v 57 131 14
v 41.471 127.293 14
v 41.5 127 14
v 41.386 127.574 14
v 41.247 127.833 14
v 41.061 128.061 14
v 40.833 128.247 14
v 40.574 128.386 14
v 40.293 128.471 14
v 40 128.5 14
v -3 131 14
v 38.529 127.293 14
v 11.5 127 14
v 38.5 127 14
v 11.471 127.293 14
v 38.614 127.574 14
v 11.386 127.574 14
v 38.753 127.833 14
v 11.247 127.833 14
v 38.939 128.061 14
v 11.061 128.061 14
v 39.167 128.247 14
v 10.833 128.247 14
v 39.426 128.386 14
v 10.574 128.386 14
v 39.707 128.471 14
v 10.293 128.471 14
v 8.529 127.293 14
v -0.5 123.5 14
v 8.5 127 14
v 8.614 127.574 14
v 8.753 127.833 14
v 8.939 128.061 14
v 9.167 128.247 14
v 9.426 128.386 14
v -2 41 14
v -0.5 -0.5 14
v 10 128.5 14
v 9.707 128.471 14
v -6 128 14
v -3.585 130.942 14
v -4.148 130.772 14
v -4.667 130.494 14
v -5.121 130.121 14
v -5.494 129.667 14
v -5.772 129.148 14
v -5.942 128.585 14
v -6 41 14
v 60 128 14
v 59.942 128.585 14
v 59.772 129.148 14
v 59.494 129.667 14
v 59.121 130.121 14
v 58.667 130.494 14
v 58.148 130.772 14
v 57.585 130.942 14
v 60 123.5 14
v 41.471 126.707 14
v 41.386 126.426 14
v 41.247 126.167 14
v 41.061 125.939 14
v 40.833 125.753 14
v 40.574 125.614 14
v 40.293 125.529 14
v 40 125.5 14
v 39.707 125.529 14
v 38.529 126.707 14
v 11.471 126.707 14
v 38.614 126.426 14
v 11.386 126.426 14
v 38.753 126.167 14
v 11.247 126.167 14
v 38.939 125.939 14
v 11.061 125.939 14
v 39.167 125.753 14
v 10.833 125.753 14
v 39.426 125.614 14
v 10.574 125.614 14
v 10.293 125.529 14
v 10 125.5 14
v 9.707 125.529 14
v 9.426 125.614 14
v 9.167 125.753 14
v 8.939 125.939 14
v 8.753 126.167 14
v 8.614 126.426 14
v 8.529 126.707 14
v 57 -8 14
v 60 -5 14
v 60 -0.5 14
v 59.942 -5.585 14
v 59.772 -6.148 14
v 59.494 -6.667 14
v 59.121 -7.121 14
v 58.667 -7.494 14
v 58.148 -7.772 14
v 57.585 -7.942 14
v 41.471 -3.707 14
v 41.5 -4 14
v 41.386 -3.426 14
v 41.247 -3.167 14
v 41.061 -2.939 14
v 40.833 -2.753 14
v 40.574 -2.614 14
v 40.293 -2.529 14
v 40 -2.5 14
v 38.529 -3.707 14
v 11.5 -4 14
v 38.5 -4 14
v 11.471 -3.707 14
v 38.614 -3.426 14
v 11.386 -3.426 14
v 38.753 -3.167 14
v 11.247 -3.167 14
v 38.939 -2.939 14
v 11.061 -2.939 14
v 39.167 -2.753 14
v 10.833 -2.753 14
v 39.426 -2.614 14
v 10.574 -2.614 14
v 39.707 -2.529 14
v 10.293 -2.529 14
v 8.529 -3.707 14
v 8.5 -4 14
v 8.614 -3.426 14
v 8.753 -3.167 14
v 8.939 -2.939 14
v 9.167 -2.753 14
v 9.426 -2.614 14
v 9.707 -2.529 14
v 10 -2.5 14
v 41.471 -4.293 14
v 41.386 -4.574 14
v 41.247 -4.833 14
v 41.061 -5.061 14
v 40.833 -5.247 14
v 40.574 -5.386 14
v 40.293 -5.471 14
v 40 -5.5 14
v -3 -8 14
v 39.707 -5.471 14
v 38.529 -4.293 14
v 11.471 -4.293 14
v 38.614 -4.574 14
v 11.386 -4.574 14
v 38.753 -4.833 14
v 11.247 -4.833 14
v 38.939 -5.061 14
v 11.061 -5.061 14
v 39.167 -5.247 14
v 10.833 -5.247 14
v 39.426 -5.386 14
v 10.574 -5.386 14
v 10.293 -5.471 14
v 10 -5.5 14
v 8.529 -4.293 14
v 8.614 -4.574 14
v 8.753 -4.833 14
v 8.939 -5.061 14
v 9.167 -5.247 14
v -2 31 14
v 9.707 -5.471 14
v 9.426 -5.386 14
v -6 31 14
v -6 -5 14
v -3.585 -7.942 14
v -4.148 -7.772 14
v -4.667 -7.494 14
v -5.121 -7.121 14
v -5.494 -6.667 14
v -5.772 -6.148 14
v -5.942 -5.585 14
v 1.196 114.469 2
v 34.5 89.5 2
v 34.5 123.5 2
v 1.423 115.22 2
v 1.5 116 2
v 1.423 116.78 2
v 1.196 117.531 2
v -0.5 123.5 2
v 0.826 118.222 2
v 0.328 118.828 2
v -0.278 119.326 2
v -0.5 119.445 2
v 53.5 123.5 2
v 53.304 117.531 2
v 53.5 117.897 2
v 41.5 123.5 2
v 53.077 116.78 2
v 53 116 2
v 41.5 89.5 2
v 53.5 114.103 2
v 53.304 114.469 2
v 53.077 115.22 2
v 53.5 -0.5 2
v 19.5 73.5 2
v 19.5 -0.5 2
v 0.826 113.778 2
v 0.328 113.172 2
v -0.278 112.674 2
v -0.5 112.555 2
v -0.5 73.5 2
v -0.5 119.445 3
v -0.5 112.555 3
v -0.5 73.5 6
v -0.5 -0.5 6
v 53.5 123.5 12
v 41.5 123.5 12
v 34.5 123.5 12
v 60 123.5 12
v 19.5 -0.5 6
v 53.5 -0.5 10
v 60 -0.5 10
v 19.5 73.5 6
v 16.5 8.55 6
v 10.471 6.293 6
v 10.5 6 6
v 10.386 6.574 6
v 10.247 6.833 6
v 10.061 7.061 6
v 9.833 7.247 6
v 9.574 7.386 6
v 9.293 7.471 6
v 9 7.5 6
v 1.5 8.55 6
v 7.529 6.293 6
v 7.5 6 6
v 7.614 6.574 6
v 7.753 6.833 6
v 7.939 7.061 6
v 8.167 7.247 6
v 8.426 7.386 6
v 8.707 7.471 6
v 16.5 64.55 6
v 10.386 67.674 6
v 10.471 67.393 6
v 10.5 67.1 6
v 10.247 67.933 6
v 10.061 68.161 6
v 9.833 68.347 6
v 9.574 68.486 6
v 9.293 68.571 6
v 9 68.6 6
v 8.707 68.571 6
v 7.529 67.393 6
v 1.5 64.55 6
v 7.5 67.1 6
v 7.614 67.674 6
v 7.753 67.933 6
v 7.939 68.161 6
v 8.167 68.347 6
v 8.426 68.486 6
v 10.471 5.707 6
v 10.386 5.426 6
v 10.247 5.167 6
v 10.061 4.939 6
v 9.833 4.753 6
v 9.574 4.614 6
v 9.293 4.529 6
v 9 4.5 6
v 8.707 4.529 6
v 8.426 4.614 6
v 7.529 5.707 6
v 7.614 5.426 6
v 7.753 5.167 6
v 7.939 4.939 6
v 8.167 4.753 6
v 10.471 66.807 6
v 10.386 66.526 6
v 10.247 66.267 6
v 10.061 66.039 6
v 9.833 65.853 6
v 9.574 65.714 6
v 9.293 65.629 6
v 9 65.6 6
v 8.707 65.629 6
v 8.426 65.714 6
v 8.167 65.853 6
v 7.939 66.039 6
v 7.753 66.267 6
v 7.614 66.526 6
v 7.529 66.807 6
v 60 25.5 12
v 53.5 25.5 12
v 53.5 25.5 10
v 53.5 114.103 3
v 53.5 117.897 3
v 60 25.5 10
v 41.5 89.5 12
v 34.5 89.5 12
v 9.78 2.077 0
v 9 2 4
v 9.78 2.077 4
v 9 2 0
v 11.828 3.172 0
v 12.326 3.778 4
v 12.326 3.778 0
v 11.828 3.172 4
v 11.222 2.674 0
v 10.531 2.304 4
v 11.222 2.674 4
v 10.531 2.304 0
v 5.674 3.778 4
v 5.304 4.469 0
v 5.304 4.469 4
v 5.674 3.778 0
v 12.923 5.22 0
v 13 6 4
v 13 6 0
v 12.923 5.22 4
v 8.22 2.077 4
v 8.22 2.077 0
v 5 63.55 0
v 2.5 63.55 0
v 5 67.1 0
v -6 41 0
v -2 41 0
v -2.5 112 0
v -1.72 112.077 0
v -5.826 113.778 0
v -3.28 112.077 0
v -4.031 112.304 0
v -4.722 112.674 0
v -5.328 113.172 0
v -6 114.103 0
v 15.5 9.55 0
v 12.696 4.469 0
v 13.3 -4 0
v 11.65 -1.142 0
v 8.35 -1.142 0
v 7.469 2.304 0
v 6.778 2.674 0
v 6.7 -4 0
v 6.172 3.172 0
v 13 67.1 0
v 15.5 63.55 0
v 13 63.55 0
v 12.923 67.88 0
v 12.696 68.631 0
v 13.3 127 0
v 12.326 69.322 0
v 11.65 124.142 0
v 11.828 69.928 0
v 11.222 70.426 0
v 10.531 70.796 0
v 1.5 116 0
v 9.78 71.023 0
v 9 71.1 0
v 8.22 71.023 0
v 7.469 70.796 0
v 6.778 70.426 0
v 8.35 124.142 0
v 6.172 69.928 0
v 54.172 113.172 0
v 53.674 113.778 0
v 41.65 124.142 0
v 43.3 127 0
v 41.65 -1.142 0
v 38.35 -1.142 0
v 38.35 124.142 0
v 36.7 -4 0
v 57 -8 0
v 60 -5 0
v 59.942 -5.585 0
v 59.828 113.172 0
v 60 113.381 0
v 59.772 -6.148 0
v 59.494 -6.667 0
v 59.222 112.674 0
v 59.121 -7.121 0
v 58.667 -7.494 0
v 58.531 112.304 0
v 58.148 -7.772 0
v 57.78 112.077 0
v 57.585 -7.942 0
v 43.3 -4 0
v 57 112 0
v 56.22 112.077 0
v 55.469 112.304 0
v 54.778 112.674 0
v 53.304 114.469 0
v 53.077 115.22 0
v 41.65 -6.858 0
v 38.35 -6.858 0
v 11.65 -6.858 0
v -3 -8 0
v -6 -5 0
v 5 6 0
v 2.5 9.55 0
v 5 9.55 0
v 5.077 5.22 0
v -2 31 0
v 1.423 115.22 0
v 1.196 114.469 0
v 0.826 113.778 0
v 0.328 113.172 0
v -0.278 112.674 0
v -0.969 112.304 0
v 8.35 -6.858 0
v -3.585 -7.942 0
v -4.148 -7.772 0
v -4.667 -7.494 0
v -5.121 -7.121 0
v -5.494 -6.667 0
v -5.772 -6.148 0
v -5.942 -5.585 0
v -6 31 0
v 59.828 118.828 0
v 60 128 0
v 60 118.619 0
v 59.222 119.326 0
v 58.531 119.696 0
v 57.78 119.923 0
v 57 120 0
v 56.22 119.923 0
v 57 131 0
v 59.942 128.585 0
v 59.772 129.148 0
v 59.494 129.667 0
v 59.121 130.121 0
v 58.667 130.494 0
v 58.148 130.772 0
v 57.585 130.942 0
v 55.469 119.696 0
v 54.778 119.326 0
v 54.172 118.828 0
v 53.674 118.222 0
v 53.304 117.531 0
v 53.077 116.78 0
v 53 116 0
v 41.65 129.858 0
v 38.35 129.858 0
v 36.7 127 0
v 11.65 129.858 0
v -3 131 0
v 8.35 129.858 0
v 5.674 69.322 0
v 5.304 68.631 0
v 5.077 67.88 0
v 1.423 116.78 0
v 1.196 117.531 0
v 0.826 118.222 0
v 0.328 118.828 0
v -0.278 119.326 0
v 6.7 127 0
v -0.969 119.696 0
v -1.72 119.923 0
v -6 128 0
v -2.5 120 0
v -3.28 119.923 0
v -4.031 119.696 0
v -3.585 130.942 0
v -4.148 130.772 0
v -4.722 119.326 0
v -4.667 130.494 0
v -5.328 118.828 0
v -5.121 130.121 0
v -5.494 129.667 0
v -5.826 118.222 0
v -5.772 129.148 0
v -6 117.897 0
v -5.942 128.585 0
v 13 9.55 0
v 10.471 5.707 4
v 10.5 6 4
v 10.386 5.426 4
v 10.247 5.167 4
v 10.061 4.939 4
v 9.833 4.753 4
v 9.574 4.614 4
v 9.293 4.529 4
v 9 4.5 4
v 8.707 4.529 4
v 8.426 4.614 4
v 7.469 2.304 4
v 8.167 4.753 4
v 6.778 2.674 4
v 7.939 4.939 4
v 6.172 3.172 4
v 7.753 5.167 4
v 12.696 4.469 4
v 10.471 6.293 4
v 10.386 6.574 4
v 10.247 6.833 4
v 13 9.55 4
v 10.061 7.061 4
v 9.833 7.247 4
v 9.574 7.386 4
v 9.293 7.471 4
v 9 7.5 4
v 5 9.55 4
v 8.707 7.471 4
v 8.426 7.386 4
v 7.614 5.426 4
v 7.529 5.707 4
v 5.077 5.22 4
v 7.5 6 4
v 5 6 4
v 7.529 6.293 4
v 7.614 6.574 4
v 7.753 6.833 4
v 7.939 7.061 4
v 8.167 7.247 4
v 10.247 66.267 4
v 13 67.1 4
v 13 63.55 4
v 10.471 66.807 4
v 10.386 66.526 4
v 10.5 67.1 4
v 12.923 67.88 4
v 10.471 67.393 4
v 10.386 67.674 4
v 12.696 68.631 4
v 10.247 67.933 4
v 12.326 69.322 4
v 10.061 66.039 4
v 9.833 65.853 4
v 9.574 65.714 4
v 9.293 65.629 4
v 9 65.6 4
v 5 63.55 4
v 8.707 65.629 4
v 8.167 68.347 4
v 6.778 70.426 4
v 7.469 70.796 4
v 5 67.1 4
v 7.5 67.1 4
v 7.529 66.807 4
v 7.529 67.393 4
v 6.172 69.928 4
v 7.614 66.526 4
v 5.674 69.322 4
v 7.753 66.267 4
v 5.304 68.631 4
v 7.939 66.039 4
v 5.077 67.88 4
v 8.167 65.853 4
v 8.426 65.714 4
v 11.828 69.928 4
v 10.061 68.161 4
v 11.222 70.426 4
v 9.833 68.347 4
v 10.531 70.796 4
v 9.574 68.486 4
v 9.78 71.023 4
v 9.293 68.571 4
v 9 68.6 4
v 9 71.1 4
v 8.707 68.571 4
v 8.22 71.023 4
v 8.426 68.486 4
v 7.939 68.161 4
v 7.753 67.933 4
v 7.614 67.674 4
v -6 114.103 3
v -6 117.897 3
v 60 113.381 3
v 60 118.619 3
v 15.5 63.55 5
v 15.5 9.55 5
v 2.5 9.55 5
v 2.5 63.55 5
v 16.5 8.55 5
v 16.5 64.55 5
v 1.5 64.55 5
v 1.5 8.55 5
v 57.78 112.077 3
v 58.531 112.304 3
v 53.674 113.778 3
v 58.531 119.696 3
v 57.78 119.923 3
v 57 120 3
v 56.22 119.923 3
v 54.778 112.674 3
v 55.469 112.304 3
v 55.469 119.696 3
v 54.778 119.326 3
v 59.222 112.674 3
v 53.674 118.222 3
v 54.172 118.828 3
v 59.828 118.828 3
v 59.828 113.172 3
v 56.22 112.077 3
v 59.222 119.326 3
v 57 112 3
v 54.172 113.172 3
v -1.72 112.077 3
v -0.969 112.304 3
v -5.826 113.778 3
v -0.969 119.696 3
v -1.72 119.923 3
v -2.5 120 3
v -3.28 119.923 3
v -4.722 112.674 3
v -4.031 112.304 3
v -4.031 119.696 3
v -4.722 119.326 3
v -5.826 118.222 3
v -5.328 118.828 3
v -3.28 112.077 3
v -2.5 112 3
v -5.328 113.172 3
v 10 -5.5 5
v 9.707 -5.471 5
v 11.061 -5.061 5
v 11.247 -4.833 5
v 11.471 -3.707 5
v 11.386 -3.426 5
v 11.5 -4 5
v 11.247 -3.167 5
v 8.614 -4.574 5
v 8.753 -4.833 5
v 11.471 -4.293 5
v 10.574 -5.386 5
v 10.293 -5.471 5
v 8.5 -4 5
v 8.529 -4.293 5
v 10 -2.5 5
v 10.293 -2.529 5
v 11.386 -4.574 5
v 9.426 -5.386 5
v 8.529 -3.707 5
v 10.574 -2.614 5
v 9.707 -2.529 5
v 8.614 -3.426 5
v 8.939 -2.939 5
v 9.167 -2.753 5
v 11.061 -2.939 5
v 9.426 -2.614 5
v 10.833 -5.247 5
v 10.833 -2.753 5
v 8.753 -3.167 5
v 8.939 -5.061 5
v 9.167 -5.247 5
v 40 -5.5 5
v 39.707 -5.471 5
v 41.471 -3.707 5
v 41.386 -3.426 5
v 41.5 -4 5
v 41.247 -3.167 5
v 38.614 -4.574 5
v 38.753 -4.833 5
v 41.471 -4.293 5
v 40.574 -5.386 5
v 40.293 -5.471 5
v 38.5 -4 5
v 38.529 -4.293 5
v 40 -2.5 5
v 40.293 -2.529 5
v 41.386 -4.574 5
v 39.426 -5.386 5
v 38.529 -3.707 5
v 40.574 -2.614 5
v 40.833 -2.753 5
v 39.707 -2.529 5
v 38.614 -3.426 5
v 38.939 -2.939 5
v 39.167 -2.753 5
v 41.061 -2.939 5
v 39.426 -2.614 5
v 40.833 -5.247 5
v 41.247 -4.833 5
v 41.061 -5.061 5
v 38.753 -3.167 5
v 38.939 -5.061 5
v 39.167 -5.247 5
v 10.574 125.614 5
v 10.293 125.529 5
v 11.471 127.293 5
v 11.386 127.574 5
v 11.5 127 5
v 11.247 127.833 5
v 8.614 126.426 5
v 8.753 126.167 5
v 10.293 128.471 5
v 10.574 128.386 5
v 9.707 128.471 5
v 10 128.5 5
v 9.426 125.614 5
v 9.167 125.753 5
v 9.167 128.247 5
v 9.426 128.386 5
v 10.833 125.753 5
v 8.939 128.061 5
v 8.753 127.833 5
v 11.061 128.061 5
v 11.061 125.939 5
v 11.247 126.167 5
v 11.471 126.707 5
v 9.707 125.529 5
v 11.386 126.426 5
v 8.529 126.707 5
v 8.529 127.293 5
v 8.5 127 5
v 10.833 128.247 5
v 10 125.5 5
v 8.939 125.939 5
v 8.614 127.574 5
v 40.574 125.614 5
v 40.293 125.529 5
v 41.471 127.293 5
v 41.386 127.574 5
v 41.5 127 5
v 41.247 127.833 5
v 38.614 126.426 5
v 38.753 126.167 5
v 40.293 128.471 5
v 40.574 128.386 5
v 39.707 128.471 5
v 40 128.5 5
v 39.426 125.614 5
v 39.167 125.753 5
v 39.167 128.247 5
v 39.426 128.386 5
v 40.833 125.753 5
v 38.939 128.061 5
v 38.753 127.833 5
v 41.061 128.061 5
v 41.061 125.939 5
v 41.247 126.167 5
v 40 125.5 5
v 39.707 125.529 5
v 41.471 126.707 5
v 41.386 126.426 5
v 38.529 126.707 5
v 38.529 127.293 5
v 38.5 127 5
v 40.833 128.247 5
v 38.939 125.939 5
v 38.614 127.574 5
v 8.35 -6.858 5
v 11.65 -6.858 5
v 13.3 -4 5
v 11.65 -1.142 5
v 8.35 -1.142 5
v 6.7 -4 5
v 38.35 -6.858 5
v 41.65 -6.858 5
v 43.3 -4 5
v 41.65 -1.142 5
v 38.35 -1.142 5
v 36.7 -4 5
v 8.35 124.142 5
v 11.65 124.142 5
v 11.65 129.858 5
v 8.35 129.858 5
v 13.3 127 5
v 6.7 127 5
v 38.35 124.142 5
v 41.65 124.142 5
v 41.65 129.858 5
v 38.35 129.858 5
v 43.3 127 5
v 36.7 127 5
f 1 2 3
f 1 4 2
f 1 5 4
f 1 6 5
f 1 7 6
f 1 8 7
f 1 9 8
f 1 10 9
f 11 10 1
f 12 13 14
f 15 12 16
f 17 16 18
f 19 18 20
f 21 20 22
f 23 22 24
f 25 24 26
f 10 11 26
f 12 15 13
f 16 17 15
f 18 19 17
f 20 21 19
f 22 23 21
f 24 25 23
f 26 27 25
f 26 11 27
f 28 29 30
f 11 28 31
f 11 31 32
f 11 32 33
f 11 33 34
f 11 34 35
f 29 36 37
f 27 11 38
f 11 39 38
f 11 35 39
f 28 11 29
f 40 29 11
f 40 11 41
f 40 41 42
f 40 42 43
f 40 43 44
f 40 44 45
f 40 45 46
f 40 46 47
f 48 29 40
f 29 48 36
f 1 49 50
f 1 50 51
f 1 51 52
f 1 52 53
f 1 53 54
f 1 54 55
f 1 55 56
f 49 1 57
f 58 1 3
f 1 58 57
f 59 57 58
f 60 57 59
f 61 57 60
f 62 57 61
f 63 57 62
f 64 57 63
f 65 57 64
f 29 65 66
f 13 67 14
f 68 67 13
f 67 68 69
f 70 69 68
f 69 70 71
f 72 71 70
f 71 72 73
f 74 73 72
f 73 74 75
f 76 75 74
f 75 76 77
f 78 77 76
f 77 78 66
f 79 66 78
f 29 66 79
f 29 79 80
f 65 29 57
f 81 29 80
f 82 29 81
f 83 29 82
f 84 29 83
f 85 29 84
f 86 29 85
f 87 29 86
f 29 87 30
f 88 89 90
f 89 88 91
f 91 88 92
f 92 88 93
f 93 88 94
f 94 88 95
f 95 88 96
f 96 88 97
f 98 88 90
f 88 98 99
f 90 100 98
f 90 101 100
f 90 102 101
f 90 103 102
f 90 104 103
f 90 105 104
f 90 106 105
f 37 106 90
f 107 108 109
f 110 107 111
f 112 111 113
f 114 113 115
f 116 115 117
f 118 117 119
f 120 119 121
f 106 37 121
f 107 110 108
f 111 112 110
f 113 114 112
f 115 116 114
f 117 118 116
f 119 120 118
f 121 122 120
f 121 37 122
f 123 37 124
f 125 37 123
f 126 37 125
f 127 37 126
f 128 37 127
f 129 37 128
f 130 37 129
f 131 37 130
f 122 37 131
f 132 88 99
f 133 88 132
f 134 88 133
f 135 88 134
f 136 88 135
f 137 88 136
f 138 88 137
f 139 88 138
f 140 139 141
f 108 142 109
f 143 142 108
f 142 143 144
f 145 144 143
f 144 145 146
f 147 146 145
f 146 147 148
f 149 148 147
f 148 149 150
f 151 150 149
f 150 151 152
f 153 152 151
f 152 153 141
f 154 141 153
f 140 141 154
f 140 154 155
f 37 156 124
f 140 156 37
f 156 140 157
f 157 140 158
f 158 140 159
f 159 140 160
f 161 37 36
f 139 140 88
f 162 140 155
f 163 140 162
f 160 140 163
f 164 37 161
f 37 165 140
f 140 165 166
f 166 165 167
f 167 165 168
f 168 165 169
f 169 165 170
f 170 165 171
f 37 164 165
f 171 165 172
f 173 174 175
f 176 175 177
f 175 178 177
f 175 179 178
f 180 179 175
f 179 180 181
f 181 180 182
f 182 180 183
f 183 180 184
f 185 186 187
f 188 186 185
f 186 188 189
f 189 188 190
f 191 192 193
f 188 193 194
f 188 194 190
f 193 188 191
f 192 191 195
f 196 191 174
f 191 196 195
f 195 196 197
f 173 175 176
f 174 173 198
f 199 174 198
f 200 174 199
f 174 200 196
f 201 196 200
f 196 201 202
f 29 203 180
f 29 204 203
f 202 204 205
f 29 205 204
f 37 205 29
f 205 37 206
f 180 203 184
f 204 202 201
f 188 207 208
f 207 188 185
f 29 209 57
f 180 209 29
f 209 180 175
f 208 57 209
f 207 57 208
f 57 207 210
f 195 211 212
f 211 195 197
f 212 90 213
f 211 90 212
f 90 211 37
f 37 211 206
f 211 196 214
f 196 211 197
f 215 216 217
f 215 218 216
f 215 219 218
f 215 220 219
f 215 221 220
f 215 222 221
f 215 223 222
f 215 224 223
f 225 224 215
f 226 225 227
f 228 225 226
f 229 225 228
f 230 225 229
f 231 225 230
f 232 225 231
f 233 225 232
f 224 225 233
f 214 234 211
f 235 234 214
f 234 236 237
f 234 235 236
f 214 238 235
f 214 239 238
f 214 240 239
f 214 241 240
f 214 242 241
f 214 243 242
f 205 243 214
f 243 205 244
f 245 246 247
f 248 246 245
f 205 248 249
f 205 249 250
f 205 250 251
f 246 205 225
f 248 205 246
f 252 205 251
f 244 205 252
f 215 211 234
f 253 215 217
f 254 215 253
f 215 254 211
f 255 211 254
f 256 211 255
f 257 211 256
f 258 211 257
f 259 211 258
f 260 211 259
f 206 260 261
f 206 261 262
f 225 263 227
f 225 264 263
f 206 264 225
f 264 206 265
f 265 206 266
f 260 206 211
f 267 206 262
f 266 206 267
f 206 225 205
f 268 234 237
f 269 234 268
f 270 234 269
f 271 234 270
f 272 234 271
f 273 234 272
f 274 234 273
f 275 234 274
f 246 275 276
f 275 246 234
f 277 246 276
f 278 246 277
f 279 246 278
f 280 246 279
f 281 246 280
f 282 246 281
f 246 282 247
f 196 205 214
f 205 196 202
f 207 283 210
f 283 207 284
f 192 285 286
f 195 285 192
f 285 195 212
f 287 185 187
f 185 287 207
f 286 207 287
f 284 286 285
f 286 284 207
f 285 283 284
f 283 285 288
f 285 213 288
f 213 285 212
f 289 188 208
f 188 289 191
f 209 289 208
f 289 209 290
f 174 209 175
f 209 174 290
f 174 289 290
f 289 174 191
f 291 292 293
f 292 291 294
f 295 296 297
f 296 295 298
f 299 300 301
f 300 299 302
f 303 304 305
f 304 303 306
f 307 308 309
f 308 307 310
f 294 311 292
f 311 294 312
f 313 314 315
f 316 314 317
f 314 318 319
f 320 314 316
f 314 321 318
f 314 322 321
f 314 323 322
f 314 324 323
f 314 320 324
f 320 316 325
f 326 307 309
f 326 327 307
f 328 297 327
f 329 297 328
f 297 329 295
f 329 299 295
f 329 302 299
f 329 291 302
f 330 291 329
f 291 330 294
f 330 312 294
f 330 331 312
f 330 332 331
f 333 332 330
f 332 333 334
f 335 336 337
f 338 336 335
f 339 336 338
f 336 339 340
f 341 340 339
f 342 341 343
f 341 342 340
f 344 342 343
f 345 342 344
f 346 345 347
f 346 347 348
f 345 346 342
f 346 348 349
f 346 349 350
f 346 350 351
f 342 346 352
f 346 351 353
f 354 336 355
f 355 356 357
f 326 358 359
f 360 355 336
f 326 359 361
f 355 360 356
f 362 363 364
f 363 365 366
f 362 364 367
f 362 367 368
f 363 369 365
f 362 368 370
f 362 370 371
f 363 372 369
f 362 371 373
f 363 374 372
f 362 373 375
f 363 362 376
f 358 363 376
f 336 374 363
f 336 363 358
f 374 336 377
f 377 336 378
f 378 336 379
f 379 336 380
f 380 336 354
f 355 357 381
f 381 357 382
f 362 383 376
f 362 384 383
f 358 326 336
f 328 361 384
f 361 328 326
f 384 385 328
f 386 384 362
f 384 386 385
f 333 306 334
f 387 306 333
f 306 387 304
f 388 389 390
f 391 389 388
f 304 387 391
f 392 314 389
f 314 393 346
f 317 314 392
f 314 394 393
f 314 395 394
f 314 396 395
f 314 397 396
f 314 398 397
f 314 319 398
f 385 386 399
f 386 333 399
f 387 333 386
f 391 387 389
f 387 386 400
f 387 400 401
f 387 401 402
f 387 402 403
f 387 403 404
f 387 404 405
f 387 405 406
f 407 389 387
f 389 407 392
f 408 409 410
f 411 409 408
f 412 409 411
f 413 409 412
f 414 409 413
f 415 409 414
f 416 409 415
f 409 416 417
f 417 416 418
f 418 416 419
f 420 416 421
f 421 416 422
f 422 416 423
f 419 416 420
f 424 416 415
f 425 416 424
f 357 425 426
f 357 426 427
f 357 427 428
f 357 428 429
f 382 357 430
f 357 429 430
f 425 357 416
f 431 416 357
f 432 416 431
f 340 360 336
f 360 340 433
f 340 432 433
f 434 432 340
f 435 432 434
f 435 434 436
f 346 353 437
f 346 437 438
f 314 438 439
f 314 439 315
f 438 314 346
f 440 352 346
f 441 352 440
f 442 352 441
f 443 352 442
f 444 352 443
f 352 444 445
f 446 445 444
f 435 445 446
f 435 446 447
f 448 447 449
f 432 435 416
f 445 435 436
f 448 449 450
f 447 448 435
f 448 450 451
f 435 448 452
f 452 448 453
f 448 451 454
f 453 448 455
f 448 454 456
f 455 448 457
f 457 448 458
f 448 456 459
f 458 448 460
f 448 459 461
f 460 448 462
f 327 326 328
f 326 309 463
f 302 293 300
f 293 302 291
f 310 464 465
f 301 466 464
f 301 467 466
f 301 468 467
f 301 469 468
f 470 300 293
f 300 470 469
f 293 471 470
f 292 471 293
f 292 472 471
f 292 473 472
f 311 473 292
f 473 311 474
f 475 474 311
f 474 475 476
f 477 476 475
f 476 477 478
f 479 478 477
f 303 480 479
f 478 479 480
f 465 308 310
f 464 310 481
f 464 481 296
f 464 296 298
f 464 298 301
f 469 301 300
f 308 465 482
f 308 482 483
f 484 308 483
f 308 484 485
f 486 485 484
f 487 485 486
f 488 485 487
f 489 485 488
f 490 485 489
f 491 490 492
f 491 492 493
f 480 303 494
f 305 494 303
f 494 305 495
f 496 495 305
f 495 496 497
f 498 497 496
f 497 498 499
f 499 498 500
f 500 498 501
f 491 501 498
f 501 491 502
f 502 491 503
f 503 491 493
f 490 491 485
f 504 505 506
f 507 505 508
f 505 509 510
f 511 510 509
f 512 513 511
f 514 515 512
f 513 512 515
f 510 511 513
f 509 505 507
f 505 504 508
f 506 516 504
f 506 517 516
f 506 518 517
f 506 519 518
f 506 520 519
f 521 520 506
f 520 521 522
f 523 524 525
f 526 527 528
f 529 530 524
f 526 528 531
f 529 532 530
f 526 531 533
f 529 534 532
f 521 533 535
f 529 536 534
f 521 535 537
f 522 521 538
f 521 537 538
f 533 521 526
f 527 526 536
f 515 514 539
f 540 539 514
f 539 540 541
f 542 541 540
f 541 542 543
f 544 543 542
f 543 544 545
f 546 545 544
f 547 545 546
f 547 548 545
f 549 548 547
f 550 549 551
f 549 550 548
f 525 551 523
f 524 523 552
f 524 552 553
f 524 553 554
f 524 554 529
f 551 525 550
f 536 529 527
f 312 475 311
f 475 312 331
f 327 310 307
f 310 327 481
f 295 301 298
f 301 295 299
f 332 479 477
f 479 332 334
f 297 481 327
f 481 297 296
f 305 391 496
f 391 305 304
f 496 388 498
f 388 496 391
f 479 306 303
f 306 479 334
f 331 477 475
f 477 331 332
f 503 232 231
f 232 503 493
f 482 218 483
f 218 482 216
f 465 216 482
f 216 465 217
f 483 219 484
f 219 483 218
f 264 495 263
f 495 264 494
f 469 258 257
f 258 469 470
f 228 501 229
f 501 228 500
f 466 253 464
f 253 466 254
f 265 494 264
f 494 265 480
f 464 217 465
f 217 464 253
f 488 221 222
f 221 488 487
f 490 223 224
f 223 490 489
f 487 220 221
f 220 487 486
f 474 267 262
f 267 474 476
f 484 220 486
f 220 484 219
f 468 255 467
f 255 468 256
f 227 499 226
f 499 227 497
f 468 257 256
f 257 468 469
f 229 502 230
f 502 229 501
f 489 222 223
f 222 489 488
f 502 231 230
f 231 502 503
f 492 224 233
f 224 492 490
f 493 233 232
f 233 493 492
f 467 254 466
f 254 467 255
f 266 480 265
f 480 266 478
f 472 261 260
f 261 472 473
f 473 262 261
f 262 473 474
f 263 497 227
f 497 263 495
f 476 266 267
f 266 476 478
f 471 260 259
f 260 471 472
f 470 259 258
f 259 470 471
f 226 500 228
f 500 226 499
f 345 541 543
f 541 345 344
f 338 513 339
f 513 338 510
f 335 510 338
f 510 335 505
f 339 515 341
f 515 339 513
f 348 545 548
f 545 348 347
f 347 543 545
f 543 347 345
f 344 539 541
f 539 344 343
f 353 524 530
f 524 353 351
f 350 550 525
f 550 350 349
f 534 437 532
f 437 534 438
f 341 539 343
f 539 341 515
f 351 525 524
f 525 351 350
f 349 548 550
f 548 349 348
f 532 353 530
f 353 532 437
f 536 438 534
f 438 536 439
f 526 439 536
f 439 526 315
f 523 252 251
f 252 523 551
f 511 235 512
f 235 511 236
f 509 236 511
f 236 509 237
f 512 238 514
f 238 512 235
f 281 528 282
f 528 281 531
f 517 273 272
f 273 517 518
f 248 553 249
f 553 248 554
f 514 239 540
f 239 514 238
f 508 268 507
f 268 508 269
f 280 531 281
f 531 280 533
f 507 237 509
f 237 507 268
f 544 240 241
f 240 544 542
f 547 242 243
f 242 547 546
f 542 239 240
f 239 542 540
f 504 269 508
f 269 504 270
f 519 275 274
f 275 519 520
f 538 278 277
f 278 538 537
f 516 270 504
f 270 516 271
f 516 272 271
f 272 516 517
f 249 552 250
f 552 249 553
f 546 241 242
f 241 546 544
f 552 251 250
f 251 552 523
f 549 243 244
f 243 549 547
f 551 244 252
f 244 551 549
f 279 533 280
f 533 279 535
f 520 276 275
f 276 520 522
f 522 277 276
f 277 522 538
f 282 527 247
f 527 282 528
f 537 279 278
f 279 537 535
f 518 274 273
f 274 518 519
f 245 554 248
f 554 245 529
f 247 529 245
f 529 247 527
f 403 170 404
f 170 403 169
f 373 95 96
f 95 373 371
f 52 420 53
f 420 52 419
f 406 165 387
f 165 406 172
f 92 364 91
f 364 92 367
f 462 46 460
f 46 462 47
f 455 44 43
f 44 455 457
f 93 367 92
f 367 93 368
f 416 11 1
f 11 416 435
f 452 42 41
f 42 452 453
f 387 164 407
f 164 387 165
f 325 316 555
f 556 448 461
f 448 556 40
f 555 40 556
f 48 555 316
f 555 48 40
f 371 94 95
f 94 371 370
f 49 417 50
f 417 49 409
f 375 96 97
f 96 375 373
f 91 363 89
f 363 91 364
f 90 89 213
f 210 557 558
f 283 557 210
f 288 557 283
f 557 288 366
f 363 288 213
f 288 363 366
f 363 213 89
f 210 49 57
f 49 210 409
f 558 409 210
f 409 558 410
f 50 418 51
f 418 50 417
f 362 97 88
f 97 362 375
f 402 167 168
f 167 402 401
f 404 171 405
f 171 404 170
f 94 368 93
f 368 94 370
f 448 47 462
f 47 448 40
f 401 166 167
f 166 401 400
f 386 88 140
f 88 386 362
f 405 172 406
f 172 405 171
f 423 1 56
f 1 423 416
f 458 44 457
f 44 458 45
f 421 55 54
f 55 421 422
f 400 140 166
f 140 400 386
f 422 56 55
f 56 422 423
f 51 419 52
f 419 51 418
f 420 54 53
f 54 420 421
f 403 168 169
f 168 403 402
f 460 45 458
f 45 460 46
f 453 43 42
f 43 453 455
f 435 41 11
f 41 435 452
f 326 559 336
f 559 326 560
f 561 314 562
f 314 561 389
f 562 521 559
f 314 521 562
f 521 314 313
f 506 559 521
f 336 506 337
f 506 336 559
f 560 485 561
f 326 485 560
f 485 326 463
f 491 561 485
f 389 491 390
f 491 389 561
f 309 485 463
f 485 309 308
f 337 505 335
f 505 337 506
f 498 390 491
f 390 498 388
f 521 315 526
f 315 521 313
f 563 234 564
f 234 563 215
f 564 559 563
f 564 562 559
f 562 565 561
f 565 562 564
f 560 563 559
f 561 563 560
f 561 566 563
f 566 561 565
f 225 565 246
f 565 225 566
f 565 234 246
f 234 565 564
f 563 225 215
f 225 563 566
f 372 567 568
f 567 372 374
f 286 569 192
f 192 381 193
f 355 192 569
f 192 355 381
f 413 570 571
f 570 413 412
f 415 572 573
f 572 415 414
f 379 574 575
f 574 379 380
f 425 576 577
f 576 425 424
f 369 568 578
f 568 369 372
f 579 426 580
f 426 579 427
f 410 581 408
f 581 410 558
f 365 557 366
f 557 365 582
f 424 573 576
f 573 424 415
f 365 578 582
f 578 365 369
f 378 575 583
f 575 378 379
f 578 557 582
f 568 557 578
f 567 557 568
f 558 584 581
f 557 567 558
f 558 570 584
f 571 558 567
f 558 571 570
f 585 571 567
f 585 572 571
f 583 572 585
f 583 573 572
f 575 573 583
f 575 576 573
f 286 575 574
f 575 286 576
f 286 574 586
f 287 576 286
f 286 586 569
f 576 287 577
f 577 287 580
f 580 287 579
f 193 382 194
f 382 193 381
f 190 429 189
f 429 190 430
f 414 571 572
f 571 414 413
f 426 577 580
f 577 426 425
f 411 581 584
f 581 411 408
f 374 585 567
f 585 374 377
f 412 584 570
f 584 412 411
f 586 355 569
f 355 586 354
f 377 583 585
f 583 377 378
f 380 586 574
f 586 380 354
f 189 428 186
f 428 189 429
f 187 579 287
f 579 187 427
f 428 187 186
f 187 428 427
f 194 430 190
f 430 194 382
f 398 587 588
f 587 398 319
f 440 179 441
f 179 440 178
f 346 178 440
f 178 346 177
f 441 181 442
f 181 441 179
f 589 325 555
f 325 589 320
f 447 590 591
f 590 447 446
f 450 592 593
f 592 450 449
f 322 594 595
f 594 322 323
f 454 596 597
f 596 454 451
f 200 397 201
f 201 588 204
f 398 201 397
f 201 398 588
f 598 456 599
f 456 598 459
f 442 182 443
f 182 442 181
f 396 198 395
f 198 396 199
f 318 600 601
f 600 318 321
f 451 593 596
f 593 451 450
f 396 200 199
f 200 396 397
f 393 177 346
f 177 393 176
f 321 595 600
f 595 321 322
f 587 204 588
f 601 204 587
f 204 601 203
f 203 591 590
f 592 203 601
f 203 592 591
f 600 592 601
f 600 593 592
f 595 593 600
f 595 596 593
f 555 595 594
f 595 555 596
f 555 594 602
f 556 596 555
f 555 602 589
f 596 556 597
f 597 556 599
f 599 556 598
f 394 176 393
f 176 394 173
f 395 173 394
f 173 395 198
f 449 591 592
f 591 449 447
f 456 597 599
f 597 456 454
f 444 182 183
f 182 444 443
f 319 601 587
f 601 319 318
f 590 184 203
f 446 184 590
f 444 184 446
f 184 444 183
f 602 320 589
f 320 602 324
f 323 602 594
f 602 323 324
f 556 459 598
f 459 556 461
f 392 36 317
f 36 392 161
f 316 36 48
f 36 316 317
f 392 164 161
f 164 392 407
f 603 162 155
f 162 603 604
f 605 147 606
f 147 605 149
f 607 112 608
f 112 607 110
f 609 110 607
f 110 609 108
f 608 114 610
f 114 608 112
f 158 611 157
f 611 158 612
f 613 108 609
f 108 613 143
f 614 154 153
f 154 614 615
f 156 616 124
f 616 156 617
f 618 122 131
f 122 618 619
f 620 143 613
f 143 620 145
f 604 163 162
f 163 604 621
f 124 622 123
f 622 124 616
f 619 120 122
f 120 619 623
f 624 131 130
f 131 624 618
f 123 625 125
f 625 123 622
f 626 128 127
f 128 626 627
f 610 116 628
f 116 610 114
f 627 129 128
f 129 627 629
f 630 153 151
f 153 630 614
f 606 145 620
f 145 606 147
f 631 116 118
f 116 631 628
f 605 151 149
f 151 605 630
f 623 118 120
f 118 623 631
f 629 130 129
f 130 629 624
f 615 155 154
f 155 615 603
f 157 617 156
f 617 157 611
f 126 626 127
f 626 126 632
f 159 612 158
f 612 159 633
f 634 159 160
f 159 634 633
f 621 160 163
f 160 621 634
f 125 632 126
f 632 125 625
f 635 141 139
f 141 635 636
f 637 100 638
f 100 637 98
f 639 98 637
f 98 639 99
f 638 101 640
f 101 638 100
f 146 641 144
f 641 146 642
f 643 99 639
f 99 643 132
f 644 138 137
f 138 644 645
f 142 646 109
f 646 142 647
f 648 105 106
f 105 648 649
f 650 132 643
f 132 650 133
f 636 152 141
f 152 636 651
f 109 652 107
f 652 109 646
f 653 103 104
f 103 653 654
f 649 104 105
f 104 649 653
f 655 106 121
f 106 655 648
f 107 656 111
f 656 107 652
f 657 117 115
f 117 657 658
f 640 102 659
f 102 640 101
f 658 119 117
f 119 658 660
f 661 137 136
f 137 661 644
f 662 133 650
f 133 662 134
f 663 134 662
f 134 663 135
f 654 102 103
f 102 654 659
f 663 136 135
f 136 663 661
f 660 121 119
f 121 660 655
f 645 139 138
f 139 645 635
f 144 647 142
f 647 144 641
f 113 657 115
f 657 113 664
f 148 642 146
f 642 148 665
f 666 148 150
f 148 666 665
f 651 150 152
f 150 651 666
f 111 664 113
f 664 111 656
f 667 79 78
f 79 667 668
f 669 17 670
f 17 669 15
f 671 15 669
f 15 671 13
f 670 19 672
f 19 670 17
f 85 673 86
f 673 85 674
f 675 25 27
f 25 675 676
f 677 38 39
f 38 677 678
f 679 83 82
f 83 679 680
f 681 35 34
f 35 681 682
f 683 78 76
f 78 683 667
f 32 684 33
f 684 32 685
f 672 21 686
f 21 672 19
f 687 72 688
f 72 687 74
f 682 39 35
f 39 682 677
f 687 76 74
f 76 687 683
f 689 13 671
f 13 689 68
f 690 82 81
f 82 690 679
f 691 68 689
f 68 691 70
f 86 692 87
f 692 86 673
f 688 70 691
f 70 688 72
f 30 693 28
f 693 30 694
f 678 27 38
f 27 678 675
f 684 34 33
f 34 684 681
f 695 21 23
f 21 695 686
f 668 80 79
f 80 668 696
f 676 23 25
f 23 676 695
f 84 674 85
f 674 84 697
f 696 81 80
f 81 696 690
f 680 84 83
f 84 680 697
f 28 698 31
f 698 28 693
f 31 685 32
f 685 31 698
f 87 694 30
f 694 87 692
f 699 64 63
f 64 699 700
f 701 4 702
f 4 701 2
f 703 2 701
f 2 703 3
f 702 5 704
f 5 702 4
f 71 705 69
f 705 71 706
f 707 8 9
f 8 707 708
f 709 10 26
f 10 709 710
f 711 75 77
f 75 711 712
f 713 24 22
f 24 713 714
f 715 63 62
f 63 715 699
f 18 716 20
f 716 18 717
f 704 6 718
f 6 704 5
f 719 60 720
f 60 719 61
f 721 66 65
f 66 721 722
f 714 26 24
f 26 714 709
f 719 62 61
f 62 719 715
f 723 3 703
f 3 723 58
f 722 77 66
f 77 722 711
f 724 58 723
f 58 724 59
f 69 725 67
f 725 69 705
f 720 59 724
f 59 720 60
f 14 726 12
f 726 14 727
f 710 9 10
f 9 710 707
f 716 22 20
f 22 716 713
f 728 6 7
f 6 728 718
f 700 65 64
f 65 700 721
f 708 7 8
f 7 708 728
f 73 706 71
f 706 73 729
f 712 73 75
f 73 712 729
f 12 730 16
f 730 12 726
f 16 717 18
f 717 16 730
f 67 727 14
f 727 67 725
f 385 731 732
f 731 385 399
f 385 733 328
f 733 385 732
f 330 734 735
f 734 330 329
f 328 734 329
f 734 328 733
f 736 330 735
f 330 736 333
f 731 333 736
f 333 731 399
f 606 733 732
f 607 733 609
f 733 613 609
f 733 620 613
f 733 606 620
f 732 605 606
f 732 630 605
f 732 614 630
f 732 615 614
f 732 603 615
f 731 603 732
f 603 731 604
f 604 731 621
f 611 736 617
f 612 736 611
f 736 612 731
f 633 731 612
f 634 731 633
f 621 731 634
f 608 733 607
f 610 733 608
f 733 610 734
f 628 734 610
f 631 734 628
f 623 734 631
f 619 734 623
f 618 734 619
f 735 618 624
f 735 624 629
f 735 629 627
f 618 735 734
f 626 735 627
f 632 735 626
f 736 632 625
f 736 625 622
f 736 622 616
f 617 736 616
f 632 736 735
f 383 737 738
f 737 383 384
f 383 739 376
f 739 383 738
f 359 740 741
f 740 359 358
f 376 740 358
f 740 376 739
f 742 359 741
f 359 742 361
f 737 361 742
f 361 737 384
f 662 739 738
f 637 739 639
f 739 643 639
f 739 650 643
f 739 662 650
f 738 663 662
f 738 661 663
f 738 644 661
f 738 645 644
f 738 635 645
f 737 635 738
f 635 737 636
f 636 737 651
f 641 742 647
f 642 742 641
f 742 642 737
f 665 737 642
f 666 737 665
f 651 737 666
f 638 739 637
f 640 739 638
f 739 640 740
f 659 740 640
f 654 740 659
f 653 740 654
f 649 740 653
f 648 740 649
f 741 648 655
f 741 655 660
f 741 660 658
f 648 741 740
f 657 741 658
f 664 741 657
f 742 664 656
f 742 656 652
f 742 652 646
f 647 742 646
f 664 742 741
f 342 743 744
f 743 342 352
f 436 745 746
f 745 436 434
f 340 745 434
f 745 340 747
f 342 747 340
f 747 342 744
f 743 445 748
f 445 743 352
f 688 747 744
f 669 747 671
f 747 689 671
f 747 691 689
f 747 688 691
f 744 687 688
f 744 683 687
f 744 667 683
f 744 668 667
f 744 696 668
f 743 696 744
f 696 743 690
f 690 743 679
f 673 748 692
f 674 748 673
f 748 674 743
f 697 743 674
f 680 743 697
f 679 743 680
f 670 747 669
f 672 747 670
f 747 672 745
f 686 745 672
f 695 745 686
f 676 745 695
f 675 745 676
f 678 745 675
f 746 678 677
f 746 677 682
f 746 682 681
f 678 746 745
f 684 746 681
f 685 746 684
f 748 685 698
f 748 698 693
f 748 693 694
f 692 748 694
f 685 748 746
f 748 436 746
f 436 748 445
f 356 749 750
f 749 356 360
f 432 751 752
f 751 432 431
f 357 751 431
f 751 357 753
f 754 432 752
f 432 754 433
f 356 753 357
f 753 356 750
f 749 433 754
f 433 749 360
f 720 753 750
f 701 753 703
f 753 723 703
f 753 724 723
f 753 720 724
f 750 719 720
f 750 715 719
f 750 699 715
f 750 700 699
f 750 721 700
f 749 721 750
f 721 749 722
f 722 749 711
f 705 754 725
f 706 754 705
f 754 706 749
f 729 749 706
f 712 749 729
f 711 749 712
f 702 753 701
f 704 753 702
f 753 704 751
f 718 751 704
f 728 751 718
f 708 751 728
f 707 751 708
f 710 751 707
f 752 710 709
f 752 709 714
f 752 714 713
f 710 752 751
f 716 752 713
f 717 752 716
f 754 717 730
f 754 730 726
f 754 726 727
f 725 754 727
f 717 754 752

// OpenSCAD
 $fn=32;
 
radius = 3; 
height=  12;
width = 66-radius-radius;
length = 123+16-radius-radius;


difference(){
translate([-3,-5,0])
   
    hull(){
            translate([0,0,0]){
            cylinder(r=radius,h=height+2);
            }
            translate([width,0,0]){
            cylinder(r=radius,h=height+2);
            }
            translate([0,length,0]){
            cylinder(r=radius,h=height+2);
            }
            translate([width,length,0]){
            cylinder(r=radius,h=height+2);
            }
        }
        
     //inner cutoff   
     translate([-0.5,-0.5,2])
        difference (){
        cube ([width+3.5, length-10+1,height]); 
     //DSUB 50 support
        cube ([20,74,4]);
     // below support       
        translate([54,26,0])
        cube ([10,123,height-2]); 
        translate([54,0,0])
        cube ([10,123,height-4]);     
      // rs232 support 
        translate([35,90,0])
        cube ([7,123,height-2]);         
        }
        
    //DSUB 50 cutoff   
        
    translate([9,6,0]){
    cylinder(r=4,h=4);
    cylinder(r=1.5,h=6);
    }       
      
    translate([9,6+61.1,0]){
    cylinder(r=4,h=4);   
    cylinder(r=1.5,h=6);   
    }   
    translate([9-13/2,6+(61.1-54)/2,0])
    cube ([13, 54,height]);
   
    translate([9-8/2,6,0])
    cube ([8, 61.1,4]);
    
    translate([1.5,6+(61.1-56)/2,5])
    cube ([15, 56,4]);
    
     // cutoff  for screw (rear of 7075)
    translate ([57,116,0])
    cylinder(r=4,h=3);
    
    translate ([-2.5,116,0])
    cylinder(r=4,h=3);
    
     // cutoff  for screw
    translate([-6,31,0])
    cube ([4, 10,height+2]);   
    
    // hole for screw 
    translate([10,-4,0])
    cylinder(r=1.5,h=20);   
    
    translate([10+30,-4,0])
    cylinder(r=1.5,h=20); 
    
    translate([10,-4+123+8,0])
    cylinder(r=1.5,h=20); 
    
    translate([10+30,-4+123+8,0])
    cylinder(r=1.5,h=20); 
  // hole for nuts  
   
    translate([10,-4,0])
    cylinder(r=3.3,h=5,$fn=6);  
     
    translate([10+30,-4,0])
    cylinder(r=3.3,h=5,$fn=6); 
    
    translate([10,-4+123+8,0])
    cylinder(r=3.3,h=5,$fn=6); 
    
    translate([10+30,-4+123+8,0])
    cylinder(r=3.3,h=5,$fn=6); 
    
   
        
    }
